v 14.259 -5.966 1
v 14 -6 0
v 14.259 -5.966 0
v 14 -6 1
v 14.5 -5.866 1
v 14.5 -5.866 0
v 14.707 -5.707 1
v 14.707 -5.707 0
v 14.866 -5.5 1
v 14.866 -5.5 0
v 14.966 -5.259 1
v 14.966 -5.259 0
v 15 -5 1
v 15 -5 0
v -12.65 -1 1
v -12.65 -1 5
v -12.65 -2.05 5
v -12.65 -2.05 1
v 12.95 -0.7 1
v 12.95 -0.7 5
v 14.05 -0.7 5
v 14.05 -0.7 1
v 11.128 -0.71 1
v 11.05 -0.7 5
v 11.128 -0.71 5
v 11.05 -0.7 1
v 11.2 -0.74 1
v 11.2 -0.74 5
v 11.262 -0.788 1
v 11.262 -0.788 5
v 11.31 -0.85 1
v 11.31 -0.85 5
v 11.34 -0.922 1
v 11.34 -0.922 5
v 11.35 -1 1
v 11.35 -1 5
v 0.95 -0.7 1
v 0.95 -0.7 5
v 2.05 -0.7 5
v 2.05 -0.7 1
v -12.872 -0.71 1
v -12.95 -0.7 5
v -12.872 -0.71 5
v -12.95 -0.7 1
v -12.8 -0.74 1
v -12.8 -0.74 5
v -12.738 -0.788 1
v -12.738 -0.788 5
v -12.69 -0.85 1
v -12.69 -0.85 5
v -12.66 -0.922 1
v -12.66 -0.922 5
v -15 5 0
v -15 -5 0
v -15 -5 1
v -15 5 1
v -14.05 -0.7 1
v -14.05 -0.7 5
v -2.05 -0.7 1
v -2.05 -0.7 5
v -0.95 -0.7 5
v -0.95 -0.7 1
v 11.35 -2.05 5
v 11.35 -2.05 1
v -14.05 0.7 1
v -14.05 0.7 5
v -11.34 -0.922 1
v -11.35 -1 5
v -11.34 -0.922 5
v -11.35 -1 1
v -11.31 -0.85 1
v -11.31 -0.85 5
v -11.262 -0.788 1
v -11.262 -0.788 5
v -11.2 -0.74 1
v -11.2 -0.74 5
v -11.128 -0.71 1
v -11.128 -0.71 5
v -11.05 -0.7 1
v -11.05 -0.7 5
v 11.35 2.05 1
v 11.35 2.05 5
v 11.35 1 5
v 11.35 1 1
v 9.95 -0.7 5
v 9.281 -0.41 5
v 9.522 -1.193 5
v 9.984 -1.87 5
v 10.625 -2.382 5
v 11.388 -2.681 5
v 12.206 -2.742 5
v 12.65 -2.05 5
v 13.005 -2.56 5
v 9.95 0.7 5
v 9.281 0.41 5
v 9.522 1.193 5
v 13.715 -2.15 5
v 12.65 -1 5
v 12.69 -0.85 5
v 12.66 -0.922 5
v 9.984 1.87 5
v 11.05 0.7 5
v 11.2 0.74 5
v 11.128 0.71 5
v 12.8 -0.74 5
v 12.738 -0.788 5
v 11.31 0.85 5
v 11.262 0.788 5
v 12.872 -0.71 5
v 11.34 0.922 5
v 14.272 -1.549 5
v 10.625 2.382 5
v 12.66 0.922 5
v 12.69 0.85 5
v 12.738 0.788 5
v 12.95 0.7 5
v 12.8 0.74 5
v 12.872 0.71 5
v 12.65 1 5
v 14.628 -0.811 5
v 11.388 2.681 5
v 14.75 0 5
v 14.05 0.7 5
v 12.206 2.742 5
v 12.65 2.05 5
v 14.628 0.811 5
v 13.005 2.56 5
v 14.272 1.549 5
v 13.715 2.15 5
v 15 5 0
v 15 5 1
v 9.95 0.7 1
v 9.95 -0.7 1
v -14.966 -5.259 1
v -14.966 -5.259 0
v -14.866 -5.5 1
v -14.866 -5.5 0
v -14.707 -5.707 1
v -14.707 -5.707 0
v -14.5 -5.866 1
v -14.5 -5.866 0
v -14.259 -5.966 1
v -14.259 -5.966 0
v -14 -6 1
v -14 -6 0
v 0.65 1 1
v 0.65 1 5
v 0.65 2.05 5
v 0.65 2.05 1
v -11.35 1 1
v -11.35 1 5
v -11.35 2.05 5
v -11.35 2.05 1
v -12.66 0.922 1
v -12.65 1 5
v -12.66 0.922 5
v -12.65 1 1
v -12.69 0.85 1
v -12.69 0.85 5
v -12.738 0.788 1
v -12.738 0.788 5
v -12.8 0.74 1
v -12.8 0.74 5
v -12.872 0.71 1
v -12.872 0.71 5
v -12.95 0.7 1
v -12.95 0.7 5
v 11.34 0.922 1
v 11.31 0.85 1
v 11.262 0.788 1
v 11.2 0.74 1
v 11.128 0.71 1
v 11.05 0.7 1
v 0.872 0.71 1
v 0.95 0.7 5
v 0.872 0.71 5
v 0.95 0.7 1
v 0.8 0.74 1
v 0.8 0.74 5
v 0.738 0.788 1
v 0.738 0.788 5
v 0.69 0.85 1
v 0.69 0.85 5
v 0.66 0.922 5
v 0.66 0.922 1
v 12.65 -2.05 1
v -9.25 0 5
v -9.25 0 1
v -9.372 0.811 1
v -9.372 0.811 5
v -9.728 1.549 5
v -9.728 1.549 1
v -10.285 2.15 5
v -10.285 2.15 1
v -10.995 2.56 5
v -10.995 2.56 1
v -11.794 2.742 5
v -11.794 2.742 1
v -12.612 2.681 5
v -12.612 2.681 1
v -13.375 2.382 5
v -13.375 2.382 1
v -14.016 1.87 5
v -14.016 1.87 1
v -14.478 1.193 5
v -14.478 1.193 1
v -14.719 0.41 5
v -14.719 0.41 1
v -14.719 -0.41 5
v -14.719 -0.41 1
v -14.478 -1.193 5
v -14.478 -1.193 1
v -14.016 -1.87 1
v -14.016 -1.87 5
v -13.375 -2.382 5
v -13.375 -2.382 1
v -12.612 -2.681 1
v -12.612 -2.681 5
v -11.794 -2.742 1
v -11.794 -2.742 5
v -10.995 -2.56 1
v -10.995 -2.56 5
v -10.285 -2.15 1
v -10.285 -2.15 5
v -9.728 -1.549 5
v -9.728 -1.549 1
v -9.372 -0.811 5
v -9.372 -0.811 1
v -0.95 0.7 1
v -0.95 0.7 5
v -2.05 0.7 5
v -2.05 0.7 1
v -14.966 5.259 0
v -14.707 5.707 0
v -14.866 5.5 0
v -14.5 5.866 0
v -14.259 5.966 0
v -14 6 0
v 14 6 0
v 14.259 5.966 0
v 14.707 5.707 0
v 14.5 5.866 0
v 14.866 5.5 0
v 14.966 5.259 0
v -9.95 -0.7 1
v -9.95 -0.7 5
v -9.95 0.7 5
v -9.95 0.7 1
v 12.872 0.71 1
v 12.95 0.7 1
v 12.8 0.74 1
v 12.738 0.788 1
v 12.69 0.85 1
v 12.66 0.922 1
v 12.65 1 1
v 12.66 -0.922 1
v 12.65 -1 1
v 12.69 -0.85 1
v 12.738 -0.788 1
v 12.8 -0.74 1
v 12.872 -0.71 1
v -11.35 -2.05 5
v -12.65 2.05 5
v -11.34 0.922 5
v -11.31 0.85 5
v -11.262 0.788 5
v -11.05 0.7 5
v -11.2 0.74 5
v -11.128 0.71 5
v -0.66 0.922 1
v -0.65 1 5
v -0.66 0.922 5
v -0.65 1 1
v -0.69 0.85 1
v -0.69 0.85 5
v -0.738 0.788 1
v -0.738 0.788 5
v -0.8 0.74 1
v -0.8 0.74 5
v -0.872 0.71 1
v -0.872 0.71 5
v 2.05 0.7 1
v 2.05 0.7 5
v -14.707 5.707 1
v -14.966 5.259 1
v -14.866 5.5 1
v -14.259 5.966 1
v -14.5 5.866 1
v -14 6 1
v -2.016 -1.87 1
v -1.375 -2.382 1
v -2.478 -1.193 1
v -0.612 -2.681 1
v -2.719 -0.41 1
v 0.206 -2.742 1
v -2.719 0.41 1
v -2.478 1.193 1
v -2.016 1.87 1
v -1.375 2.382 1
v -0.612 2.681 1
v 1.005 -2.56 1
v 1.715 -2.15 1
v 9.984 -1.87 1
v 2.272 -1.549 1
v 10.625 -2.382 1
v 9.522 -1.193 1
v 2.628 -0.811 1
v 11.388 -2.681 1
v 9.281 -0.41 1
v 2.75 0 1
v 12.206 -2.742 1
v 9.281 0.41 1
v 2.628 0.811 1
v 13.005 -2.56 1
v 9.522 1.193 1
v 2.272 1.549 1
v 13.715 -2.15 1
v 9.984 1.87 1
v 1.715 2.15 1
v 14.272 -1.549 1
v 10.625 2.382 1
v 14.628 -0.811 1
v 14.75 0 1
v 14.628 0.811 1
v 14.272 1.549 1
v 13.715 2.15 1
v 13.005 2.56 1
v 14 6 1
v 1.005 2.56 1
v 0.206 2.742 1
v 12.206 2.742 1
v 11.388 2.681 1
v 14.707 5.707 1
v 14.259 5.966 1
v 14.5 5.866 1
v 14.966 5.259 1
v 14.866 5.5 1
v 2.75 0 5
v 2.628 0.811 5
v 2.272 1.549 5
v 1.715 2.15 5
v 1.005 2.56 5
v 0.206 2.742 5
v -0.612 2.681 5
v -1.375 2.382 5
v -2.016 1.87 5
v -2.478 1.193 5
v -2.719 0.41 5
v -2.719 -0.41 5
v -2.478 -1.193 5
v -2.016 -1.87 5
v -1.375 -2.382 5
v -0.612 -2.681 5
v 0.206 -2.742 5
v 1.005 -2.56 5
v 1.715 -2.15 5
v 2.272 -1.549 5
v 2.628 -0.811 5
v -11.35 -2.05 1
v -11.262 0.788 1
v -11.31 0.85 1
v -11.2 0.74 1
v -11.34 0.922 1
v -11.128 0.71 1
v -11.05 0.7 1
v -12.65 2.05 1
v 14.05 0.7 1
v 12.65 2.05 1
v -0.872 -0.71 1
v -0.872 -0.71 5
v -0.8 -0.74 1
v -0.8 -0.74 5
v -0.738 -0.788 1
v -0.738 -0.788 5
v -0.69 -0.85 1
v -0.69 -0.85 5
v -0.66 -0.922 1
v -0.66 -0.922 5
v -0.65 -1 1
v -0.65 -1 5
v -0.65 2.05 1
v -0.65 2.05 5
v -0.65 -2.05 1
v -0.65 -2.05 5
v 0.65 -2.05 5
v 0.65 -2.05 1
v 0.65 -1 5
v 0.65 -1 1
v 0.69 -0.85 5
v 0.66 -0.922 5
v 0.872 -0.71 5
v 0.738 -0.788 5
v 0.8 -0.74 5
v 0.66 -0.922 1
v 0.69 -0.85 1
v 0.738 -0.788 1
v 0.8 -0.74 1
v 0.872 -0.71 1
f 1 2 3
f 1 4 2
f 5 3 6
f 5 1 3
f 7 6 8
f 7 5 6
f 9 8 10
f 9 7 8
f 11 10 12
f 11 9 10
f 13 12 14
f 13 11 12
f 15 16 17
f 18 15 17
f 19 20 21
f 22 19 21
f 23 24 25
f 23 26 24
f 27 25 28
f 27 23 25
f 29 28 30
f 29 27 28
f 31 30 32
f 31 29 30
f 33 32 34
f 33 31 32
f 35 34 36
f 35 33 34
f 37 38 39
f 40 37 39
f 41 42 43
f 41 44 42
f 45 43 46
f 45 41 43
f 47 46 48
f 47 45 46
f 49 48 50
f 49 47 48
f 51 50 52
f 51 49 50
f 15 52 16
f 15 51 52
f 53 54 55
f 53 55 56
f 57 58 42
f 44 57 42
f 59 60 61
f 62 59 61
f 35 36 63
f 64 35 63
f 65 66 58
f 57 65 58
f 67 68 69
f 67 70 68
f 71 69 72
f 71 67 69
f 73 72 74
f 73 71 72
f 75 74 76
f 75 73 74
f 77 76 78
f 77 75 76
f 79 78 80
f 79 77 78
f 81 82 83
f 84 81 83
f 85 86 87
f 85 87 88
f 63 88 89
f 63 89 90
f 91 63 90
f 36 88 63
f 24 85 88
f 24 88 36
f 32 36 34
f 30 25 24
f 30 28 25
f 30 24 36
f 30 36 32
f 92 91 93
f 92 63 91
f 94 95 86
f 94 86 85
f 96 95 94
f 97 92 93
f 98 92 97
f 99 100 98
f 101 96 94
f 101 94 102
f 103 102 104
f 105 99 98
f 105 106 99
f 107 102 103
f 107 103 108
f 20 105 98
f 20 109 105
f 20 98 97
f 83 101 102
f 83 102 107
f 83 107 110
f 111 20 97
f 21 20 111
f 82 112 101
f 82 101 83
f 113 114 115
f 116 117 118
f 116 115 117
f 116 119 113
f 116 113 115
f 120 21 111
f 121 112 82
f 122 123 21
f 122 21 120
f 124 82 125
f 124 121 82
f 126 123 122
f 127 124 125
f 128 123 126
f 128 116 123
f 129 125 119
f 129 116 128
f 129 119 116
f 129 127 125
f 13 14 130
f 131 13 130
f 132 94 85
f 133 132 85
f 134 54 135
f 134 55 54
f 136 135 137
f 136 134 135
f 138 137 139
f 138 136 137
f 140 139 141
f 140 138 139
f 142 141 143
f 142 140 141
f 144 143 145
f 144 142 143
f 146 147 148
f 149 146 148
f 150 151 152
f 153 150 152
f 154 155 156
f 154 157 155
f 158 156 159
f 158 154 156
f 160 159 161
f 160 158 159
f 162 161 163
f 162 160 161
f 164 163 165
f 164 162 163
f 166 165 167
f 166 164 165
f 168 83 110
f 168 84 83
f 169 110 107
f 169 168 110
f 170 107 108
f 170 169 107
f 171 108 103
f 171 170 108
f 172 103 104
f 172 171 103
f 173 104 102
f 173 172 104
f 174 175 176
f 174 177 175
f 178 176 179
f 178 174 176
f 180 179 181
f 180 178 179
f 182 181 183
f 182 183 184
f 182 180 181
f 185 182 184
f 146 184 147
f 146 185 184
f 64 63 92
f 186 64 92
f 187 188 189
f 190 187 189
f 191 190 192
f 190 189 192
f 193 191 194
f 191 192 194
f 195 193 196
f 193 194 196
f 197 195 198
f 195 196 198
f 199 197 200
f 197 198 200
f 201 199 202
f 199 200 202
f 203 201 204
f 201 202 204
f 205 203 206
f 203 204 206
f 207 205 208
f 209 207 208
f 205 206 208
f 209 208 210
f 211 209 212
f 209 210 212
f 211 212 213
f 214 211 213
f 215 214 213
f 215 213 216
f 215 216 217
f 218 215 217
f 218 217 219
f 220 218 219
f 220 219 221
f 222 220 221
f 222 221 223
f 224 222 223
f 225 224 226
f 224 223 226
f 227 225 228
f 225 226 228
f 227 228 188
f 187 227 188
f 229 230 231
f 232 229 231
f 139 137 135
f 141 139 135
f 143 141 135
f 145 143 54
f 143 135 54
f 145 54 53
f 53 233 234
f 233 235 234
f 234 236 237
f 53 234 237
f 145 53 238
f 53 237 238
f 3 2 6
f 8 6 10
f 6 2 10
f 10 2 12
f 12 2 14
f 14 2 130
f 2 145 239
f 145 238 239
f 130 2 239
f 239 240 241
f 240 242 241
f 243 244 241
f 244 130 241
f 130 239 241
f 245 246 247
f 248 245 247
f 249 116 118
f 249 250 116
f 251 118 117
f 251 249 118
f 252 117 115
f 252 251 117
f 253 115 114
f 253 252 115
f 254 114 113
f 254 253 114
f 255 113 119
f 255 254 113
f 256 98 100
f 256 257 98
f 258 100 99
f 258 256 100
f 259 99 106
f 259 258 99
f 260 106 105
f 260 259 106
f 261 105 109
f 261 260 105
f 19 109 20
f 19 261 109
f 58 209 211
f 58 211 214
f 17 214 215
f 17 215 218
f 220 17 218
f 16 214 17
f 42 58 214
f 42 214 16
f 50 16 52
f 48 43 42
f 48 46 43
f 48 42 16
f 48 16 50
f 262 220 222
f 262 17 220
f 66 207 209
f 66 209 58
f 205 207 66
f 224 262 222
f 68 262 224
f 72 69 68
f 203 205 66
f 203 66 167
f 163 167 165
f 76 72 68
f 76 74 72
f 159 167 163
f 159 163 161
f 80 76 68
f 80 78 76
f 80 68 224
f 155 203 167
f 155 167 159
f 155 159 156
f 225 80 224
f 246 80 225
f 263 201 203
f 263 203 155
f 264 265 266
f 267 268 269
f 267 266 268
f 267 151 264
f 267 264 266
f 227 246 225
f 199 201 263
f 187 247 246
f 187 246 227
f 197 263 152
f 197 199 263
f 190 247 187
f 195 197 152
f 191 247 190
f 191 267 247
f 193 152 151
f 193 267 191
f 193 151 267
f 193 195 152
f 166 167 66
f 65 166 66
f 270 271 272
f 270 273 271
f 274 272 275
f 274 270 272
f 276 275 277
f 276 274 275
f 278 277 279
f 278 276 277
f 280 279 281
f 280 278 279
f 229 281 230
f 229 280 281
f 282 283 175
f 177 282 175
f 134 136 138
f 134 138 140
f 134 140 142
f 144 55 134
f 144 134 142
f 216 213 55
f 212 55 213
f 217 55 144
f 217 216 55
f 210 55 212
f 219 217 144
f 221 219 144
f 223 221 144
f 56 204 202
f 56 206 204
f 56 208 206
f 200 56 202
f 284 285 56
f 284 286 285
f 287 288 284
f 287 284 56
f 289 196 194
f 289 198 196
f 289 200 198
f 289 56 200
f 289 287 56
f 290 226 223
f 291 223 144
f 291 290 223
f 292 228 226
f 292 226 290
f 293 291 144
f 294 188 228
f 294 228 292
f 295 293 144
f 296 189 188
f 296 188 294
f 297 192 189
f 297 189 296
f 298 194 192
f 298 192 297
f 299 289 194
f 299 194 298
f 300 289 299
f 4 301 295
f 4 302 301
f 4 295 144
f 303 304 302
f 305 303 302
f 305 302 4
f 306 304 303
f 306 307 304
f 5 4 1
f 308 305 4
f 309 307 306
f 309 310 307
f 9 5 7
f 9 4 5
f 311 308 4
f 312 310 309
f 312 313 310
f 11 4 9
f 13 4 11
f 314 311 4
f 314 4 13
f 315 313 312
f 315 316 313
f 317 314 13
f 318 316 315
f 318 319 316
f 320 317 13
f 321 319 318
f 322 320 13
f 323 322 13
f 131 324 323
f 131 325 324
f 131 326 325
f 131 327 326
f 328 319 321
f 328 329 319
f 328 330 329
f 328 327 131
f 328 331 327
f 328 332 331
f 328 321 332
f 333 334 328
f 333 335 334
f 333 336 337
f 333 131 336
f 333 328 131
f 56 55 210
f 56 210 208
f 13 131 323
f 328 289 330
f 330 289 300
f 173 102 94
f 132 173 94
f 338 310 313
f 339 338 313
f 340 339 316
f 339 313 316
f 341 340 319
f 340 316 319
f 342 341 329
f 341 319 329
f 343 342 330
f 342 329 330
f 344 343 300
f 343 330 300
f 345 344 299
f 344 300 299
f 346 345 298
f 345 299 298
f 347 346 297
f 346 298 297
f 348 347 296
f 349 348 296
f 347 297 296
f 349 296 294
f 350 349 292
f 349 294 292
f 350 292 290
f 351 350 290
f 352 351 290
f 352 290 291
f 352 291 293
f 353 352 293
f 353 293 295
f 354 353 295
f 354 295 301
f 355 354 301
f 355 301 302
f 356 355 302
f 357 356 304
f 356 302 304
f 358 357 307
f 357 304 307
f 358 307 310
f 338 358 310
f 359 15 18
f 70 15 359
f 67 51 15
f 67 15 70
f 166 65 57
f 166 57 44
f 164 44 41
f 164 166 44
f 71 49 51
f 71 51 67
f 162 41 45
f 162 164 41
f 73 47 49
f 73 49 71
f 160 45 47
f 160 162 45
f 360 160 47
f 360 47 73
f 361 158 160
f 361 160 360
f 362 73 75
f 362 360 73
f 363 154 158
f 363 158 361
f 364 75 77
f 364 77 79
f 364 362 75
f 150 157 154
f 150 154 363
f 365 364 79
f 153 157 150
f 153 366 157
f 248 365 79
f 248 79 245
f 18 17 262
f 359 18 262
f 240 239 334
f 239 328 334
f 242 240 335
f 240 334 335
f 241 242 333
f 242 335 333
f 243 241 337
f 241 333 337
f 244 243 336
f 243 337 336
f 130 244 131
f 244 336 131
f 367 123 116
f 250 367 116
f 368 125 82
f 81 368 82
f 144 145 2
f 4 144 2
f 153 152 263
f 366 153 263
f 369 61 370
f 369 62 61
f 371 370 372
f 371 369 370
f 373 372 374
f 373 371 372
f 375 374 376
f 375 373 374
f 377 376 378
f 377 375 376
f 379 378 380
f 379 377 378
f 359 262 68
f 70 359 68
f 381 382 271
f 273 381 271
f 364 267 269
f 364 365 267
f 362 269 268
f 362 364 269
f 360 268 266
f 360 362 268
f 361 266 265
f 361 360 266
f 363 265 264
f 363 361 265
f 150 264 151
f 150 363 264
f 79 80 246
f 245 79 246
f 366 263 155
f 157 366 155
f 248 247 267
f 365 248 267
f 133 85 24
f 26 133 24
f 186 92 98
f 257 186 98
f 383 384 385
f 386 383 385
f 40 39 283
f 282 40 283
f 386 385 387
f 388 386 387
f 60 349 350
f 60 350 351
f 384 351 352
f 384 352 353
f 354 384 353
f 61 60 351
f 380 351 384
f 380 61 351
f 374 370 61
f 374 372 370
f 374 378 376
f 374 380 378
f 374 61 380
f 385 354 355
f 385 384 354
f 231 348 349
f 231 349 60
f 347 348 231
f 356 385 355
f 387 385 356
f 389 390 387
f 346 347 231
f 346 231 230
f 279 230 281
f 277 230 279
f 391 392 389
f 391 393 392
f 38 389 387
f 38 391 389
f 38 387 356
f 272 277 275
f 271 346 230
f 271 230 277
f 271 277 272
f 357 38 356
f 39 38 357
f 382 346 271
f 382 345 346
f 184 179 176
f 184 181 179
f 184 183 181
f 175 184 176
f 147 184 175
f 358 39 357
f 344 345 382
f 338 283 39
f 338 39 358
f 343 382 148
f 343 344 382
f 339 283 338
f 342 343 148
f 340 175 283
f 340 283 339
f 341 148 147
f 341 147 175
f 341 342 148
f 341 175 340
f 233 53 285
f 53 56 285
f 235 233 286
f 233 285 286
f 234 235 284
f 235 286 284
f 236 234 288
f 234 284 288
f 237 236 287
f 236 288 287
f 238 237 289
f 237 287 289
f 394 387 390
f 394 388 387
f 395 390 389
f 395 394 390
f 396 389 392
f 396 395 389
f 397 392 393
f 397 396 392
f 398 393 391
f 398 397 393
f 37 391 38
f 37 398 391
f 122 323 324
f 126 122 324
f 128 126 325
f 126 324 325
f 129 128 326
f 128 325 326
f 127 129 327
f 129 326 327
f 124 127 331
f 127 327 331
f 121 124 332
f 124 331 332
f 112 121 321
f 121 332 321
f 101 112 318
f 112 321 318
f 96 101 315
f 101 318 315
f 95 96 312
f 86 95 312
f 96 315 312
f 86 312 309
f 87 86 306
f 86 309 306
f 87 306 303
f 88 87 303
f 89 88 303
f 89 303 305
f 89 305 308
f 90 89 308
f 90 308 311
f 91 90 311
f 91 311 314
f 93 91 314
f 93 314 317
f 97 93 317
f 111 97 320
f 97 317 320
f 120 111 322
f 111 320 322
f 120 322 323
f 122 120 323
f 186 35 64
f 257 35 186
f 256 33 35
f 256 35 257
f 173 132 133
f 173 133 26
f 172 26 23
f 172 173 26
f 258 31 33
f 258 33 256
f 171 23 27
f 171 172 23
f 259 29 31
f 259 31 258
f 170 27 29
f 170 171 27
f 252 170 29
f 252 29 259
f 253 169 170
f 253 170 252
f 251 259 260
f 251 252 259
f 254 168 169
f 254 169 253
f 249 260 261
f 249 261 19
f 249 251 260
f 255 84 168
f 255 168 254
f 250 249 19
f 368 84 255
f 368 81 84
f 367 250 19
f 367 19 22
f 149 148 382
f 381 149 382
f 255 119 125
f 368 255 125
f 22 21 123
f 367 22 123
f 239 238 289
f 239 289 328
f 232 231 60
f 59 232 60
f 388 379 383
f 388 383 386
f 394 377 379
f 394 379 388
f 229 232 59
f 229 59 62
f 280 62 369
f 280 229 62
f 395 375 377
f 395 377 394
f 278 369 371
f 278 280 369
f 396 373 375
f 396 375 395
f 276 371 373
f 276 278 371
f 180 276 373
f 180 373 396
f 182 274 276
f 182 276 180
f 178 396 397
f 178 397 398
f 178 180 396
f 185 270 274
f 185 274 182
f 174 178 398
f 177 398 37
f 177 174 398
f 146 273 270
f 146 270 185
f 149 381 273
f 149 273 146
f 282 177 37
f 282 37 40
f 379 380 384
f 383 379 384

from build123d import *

# Parameters (mm, degrees)
SKETCH_W     = 30
SKETCH_H     = 12
PAD_DEPTH    = 1
SKETCH001_R  = 2.75
PAD001_DEPTH = 4
POCKET_DEPTH = 4
FILLET_R     = 0.3
FILLET001_R  = 1


with BuildPart() as part:
    # Sketch → Pad (new body)
    with BuildSketch(Plane.XY):
        Rectangle(SKETCH_W, SKETCH_H)
    extrude(amount=PAD_DEPTH)

    # Sketch001 (on Face6 of Pad) → Pad001 (join)
    with BuildSketch(Plane.XY.offset(1)):
        Circle(SKETCH001_R)
        with Locations((-12, 0)):
            Circle(SKETCH001_R)
        with Locations((12, 0)):
            Circle(SKETCH001_R)
    extrude(amount=PAD001_DEPTH)

    # Sketch002 (on Face11 of Pad001) → Pocket (cut)
    with BuildSketch(Plane.XY.offset(5)):
        Polygon((-0.65, 2.05), (-0.65, 0.7), (-2.05, 0.7), (-2.05, -0.7), (-0.65, -0.7), (-0.65, -2.05), (0.65, -2.05), (0.65, -0.7), (2.05, -0.7), (2.05, 0.7), (0.65, 0.7), (0.65, 2.05), align=None)
        Polygon((11.35, 2.05), (11.35, 0.7), (9.95, 0.7), (9.95, -0.7), (11.35, -0.7), (11.35, -2.05), (12.65, -2.05), (12.65, -0.7), (14.05, -0.7), (14.05, 0.7), (12.65, 0.7), (12.65, 2.05), align=None)
        Polygon((-12.65, 2.05), (-12.65, 0.7), (-14.05, 0.7), (-14.05, -0.7), (-12.65, -0.7), (-12.65, -2.05), (-11.35, -2.05), (-11.35, -0.7), (-9.95, -0.7), (-9.95, 0.7), (-11.35, 0.7), (-11.35, 2.05), align=None)
    extrude(amount=-POCKET_DEPTH, mode=Mode.SUBTRACT)

    # Fillet
    fillet_edges = [part.edges().sort_by_distance(p)[0] for p in [
        (-0.65, 0.7, 3),
        (0.65, 0.7, 3),
        (-12.65, 0.7, 3),
        (-11.35, 0.7, 3),
        (11.35, 0.7, 3),
        (12.65, 0.7, 3),
        (12.65, -0.7, 3),
        (11.35, -0.7, 3),
        (0.65, -0.7, 3),
        (-0.65, -0.7, 3),
        (-11.35, -0.7, 3),
        (-12.65, -0.7, 3),
    ]]
    fillet(fillet_edges, radius=FILLET_R)

    # Fillet001
    fillet001_edges = [part.edges().sort_by_distance(p)[0] for p in [
        (-15, -6, 0.5),
        (15, -6, 0.5),
        (-15, 6, 0.5),
        (15, 6, 0.5),
    ]]
    fillet(fillet001_edges, radius=FILLET001_R)


solid = part.part
